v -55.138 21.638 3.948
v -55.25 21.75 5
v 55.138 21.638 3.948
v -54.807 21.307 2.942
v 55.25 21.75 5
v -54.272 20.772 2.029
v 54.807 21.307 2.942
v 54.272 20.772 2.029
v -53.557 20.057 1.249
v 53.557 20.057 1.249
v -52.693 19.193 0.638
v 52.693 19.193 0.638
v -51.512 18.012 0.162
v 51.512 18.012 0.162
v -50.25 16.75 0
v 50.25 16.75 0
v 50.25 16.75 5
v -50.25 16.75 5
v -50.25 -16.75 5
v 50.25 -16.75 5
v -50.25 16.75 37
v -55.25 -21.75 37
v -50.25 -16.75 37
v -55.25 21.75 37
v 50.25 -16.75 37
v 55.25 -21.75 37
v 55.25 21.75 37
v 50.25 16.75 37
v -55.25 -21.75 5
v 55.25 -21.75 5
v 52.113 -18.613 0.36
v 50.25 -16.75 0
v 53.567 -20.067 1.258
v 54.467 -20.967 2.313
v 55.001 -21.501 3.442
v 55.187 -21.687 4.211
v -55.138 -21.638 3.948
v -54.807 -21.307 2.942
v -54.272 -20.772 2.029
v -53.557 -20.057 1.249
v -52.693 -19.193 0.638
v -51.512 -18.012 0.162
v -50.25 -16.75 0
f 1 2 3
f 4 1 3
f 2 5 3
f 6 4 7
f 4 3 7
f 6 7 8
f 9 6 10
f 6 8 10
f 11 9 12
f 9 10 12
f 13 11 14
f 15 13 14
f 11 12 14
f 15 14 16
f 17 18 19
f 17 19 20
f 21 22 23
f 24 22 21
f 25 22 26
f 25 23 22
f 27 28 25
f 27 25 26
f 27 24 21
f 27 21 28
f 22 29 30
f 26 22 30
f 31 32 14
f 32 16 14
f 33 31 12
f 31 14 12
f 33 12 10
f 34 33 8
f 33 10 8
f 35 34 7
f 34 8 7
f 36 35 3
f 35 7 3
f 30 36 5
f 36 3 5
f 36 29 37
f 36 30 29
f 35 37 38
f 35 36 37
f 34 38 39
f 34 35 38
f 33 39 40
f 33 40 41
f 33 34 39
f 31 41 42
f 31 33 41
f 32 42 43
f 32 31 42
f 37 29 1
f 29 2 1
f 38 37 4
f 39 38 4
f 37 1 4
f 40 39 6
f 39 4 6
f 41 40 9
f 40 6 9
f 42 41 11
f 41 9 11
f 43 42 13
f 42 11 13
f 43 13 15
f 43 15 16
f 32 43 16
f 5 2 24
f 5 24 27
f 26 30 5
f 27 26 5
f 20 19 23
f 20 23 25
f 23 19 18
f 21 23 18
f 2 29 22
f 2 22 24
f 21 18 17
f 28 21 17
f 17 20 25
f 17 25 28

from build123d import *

# Parameters (mm, degrees)
F0_W     = 100.5
F0_H     = 33.5
F1_DEPTH = 5
F0_W_2   = 110.5
F0_H_2   = 43.5
F2_DEPTH = 37
F3_R     = 5


with BuildPart() as f1:
    # F0 (on Top) → F1 (new body)
    with BuildSketch(Plane.XY):
        Rectangle(F0_W, F0_H)
    extrude(amount=F1_DEPTH)

    # F0 (on Top) → F2 (join)
    with BuildSketch(Plane.XY):
        Rectangle(F0_W_2, F0_H_2)
        Rectangle(F0_W, F0_H, mode=Mode.SUBTRACT)
    extrude(amount=F2_DEPTH)

    # F3
    f3_edges = [f1.edges().sort_by_distance(p)[0] for p in [
        (-55.25, 0, 0),
        (0, 21.75, 0),
        (55.25, 0, 0),
        (0, -21.75, 0),
    ]]
    fillet(f3_edges, radius=F3_R)


solid = f1.part
